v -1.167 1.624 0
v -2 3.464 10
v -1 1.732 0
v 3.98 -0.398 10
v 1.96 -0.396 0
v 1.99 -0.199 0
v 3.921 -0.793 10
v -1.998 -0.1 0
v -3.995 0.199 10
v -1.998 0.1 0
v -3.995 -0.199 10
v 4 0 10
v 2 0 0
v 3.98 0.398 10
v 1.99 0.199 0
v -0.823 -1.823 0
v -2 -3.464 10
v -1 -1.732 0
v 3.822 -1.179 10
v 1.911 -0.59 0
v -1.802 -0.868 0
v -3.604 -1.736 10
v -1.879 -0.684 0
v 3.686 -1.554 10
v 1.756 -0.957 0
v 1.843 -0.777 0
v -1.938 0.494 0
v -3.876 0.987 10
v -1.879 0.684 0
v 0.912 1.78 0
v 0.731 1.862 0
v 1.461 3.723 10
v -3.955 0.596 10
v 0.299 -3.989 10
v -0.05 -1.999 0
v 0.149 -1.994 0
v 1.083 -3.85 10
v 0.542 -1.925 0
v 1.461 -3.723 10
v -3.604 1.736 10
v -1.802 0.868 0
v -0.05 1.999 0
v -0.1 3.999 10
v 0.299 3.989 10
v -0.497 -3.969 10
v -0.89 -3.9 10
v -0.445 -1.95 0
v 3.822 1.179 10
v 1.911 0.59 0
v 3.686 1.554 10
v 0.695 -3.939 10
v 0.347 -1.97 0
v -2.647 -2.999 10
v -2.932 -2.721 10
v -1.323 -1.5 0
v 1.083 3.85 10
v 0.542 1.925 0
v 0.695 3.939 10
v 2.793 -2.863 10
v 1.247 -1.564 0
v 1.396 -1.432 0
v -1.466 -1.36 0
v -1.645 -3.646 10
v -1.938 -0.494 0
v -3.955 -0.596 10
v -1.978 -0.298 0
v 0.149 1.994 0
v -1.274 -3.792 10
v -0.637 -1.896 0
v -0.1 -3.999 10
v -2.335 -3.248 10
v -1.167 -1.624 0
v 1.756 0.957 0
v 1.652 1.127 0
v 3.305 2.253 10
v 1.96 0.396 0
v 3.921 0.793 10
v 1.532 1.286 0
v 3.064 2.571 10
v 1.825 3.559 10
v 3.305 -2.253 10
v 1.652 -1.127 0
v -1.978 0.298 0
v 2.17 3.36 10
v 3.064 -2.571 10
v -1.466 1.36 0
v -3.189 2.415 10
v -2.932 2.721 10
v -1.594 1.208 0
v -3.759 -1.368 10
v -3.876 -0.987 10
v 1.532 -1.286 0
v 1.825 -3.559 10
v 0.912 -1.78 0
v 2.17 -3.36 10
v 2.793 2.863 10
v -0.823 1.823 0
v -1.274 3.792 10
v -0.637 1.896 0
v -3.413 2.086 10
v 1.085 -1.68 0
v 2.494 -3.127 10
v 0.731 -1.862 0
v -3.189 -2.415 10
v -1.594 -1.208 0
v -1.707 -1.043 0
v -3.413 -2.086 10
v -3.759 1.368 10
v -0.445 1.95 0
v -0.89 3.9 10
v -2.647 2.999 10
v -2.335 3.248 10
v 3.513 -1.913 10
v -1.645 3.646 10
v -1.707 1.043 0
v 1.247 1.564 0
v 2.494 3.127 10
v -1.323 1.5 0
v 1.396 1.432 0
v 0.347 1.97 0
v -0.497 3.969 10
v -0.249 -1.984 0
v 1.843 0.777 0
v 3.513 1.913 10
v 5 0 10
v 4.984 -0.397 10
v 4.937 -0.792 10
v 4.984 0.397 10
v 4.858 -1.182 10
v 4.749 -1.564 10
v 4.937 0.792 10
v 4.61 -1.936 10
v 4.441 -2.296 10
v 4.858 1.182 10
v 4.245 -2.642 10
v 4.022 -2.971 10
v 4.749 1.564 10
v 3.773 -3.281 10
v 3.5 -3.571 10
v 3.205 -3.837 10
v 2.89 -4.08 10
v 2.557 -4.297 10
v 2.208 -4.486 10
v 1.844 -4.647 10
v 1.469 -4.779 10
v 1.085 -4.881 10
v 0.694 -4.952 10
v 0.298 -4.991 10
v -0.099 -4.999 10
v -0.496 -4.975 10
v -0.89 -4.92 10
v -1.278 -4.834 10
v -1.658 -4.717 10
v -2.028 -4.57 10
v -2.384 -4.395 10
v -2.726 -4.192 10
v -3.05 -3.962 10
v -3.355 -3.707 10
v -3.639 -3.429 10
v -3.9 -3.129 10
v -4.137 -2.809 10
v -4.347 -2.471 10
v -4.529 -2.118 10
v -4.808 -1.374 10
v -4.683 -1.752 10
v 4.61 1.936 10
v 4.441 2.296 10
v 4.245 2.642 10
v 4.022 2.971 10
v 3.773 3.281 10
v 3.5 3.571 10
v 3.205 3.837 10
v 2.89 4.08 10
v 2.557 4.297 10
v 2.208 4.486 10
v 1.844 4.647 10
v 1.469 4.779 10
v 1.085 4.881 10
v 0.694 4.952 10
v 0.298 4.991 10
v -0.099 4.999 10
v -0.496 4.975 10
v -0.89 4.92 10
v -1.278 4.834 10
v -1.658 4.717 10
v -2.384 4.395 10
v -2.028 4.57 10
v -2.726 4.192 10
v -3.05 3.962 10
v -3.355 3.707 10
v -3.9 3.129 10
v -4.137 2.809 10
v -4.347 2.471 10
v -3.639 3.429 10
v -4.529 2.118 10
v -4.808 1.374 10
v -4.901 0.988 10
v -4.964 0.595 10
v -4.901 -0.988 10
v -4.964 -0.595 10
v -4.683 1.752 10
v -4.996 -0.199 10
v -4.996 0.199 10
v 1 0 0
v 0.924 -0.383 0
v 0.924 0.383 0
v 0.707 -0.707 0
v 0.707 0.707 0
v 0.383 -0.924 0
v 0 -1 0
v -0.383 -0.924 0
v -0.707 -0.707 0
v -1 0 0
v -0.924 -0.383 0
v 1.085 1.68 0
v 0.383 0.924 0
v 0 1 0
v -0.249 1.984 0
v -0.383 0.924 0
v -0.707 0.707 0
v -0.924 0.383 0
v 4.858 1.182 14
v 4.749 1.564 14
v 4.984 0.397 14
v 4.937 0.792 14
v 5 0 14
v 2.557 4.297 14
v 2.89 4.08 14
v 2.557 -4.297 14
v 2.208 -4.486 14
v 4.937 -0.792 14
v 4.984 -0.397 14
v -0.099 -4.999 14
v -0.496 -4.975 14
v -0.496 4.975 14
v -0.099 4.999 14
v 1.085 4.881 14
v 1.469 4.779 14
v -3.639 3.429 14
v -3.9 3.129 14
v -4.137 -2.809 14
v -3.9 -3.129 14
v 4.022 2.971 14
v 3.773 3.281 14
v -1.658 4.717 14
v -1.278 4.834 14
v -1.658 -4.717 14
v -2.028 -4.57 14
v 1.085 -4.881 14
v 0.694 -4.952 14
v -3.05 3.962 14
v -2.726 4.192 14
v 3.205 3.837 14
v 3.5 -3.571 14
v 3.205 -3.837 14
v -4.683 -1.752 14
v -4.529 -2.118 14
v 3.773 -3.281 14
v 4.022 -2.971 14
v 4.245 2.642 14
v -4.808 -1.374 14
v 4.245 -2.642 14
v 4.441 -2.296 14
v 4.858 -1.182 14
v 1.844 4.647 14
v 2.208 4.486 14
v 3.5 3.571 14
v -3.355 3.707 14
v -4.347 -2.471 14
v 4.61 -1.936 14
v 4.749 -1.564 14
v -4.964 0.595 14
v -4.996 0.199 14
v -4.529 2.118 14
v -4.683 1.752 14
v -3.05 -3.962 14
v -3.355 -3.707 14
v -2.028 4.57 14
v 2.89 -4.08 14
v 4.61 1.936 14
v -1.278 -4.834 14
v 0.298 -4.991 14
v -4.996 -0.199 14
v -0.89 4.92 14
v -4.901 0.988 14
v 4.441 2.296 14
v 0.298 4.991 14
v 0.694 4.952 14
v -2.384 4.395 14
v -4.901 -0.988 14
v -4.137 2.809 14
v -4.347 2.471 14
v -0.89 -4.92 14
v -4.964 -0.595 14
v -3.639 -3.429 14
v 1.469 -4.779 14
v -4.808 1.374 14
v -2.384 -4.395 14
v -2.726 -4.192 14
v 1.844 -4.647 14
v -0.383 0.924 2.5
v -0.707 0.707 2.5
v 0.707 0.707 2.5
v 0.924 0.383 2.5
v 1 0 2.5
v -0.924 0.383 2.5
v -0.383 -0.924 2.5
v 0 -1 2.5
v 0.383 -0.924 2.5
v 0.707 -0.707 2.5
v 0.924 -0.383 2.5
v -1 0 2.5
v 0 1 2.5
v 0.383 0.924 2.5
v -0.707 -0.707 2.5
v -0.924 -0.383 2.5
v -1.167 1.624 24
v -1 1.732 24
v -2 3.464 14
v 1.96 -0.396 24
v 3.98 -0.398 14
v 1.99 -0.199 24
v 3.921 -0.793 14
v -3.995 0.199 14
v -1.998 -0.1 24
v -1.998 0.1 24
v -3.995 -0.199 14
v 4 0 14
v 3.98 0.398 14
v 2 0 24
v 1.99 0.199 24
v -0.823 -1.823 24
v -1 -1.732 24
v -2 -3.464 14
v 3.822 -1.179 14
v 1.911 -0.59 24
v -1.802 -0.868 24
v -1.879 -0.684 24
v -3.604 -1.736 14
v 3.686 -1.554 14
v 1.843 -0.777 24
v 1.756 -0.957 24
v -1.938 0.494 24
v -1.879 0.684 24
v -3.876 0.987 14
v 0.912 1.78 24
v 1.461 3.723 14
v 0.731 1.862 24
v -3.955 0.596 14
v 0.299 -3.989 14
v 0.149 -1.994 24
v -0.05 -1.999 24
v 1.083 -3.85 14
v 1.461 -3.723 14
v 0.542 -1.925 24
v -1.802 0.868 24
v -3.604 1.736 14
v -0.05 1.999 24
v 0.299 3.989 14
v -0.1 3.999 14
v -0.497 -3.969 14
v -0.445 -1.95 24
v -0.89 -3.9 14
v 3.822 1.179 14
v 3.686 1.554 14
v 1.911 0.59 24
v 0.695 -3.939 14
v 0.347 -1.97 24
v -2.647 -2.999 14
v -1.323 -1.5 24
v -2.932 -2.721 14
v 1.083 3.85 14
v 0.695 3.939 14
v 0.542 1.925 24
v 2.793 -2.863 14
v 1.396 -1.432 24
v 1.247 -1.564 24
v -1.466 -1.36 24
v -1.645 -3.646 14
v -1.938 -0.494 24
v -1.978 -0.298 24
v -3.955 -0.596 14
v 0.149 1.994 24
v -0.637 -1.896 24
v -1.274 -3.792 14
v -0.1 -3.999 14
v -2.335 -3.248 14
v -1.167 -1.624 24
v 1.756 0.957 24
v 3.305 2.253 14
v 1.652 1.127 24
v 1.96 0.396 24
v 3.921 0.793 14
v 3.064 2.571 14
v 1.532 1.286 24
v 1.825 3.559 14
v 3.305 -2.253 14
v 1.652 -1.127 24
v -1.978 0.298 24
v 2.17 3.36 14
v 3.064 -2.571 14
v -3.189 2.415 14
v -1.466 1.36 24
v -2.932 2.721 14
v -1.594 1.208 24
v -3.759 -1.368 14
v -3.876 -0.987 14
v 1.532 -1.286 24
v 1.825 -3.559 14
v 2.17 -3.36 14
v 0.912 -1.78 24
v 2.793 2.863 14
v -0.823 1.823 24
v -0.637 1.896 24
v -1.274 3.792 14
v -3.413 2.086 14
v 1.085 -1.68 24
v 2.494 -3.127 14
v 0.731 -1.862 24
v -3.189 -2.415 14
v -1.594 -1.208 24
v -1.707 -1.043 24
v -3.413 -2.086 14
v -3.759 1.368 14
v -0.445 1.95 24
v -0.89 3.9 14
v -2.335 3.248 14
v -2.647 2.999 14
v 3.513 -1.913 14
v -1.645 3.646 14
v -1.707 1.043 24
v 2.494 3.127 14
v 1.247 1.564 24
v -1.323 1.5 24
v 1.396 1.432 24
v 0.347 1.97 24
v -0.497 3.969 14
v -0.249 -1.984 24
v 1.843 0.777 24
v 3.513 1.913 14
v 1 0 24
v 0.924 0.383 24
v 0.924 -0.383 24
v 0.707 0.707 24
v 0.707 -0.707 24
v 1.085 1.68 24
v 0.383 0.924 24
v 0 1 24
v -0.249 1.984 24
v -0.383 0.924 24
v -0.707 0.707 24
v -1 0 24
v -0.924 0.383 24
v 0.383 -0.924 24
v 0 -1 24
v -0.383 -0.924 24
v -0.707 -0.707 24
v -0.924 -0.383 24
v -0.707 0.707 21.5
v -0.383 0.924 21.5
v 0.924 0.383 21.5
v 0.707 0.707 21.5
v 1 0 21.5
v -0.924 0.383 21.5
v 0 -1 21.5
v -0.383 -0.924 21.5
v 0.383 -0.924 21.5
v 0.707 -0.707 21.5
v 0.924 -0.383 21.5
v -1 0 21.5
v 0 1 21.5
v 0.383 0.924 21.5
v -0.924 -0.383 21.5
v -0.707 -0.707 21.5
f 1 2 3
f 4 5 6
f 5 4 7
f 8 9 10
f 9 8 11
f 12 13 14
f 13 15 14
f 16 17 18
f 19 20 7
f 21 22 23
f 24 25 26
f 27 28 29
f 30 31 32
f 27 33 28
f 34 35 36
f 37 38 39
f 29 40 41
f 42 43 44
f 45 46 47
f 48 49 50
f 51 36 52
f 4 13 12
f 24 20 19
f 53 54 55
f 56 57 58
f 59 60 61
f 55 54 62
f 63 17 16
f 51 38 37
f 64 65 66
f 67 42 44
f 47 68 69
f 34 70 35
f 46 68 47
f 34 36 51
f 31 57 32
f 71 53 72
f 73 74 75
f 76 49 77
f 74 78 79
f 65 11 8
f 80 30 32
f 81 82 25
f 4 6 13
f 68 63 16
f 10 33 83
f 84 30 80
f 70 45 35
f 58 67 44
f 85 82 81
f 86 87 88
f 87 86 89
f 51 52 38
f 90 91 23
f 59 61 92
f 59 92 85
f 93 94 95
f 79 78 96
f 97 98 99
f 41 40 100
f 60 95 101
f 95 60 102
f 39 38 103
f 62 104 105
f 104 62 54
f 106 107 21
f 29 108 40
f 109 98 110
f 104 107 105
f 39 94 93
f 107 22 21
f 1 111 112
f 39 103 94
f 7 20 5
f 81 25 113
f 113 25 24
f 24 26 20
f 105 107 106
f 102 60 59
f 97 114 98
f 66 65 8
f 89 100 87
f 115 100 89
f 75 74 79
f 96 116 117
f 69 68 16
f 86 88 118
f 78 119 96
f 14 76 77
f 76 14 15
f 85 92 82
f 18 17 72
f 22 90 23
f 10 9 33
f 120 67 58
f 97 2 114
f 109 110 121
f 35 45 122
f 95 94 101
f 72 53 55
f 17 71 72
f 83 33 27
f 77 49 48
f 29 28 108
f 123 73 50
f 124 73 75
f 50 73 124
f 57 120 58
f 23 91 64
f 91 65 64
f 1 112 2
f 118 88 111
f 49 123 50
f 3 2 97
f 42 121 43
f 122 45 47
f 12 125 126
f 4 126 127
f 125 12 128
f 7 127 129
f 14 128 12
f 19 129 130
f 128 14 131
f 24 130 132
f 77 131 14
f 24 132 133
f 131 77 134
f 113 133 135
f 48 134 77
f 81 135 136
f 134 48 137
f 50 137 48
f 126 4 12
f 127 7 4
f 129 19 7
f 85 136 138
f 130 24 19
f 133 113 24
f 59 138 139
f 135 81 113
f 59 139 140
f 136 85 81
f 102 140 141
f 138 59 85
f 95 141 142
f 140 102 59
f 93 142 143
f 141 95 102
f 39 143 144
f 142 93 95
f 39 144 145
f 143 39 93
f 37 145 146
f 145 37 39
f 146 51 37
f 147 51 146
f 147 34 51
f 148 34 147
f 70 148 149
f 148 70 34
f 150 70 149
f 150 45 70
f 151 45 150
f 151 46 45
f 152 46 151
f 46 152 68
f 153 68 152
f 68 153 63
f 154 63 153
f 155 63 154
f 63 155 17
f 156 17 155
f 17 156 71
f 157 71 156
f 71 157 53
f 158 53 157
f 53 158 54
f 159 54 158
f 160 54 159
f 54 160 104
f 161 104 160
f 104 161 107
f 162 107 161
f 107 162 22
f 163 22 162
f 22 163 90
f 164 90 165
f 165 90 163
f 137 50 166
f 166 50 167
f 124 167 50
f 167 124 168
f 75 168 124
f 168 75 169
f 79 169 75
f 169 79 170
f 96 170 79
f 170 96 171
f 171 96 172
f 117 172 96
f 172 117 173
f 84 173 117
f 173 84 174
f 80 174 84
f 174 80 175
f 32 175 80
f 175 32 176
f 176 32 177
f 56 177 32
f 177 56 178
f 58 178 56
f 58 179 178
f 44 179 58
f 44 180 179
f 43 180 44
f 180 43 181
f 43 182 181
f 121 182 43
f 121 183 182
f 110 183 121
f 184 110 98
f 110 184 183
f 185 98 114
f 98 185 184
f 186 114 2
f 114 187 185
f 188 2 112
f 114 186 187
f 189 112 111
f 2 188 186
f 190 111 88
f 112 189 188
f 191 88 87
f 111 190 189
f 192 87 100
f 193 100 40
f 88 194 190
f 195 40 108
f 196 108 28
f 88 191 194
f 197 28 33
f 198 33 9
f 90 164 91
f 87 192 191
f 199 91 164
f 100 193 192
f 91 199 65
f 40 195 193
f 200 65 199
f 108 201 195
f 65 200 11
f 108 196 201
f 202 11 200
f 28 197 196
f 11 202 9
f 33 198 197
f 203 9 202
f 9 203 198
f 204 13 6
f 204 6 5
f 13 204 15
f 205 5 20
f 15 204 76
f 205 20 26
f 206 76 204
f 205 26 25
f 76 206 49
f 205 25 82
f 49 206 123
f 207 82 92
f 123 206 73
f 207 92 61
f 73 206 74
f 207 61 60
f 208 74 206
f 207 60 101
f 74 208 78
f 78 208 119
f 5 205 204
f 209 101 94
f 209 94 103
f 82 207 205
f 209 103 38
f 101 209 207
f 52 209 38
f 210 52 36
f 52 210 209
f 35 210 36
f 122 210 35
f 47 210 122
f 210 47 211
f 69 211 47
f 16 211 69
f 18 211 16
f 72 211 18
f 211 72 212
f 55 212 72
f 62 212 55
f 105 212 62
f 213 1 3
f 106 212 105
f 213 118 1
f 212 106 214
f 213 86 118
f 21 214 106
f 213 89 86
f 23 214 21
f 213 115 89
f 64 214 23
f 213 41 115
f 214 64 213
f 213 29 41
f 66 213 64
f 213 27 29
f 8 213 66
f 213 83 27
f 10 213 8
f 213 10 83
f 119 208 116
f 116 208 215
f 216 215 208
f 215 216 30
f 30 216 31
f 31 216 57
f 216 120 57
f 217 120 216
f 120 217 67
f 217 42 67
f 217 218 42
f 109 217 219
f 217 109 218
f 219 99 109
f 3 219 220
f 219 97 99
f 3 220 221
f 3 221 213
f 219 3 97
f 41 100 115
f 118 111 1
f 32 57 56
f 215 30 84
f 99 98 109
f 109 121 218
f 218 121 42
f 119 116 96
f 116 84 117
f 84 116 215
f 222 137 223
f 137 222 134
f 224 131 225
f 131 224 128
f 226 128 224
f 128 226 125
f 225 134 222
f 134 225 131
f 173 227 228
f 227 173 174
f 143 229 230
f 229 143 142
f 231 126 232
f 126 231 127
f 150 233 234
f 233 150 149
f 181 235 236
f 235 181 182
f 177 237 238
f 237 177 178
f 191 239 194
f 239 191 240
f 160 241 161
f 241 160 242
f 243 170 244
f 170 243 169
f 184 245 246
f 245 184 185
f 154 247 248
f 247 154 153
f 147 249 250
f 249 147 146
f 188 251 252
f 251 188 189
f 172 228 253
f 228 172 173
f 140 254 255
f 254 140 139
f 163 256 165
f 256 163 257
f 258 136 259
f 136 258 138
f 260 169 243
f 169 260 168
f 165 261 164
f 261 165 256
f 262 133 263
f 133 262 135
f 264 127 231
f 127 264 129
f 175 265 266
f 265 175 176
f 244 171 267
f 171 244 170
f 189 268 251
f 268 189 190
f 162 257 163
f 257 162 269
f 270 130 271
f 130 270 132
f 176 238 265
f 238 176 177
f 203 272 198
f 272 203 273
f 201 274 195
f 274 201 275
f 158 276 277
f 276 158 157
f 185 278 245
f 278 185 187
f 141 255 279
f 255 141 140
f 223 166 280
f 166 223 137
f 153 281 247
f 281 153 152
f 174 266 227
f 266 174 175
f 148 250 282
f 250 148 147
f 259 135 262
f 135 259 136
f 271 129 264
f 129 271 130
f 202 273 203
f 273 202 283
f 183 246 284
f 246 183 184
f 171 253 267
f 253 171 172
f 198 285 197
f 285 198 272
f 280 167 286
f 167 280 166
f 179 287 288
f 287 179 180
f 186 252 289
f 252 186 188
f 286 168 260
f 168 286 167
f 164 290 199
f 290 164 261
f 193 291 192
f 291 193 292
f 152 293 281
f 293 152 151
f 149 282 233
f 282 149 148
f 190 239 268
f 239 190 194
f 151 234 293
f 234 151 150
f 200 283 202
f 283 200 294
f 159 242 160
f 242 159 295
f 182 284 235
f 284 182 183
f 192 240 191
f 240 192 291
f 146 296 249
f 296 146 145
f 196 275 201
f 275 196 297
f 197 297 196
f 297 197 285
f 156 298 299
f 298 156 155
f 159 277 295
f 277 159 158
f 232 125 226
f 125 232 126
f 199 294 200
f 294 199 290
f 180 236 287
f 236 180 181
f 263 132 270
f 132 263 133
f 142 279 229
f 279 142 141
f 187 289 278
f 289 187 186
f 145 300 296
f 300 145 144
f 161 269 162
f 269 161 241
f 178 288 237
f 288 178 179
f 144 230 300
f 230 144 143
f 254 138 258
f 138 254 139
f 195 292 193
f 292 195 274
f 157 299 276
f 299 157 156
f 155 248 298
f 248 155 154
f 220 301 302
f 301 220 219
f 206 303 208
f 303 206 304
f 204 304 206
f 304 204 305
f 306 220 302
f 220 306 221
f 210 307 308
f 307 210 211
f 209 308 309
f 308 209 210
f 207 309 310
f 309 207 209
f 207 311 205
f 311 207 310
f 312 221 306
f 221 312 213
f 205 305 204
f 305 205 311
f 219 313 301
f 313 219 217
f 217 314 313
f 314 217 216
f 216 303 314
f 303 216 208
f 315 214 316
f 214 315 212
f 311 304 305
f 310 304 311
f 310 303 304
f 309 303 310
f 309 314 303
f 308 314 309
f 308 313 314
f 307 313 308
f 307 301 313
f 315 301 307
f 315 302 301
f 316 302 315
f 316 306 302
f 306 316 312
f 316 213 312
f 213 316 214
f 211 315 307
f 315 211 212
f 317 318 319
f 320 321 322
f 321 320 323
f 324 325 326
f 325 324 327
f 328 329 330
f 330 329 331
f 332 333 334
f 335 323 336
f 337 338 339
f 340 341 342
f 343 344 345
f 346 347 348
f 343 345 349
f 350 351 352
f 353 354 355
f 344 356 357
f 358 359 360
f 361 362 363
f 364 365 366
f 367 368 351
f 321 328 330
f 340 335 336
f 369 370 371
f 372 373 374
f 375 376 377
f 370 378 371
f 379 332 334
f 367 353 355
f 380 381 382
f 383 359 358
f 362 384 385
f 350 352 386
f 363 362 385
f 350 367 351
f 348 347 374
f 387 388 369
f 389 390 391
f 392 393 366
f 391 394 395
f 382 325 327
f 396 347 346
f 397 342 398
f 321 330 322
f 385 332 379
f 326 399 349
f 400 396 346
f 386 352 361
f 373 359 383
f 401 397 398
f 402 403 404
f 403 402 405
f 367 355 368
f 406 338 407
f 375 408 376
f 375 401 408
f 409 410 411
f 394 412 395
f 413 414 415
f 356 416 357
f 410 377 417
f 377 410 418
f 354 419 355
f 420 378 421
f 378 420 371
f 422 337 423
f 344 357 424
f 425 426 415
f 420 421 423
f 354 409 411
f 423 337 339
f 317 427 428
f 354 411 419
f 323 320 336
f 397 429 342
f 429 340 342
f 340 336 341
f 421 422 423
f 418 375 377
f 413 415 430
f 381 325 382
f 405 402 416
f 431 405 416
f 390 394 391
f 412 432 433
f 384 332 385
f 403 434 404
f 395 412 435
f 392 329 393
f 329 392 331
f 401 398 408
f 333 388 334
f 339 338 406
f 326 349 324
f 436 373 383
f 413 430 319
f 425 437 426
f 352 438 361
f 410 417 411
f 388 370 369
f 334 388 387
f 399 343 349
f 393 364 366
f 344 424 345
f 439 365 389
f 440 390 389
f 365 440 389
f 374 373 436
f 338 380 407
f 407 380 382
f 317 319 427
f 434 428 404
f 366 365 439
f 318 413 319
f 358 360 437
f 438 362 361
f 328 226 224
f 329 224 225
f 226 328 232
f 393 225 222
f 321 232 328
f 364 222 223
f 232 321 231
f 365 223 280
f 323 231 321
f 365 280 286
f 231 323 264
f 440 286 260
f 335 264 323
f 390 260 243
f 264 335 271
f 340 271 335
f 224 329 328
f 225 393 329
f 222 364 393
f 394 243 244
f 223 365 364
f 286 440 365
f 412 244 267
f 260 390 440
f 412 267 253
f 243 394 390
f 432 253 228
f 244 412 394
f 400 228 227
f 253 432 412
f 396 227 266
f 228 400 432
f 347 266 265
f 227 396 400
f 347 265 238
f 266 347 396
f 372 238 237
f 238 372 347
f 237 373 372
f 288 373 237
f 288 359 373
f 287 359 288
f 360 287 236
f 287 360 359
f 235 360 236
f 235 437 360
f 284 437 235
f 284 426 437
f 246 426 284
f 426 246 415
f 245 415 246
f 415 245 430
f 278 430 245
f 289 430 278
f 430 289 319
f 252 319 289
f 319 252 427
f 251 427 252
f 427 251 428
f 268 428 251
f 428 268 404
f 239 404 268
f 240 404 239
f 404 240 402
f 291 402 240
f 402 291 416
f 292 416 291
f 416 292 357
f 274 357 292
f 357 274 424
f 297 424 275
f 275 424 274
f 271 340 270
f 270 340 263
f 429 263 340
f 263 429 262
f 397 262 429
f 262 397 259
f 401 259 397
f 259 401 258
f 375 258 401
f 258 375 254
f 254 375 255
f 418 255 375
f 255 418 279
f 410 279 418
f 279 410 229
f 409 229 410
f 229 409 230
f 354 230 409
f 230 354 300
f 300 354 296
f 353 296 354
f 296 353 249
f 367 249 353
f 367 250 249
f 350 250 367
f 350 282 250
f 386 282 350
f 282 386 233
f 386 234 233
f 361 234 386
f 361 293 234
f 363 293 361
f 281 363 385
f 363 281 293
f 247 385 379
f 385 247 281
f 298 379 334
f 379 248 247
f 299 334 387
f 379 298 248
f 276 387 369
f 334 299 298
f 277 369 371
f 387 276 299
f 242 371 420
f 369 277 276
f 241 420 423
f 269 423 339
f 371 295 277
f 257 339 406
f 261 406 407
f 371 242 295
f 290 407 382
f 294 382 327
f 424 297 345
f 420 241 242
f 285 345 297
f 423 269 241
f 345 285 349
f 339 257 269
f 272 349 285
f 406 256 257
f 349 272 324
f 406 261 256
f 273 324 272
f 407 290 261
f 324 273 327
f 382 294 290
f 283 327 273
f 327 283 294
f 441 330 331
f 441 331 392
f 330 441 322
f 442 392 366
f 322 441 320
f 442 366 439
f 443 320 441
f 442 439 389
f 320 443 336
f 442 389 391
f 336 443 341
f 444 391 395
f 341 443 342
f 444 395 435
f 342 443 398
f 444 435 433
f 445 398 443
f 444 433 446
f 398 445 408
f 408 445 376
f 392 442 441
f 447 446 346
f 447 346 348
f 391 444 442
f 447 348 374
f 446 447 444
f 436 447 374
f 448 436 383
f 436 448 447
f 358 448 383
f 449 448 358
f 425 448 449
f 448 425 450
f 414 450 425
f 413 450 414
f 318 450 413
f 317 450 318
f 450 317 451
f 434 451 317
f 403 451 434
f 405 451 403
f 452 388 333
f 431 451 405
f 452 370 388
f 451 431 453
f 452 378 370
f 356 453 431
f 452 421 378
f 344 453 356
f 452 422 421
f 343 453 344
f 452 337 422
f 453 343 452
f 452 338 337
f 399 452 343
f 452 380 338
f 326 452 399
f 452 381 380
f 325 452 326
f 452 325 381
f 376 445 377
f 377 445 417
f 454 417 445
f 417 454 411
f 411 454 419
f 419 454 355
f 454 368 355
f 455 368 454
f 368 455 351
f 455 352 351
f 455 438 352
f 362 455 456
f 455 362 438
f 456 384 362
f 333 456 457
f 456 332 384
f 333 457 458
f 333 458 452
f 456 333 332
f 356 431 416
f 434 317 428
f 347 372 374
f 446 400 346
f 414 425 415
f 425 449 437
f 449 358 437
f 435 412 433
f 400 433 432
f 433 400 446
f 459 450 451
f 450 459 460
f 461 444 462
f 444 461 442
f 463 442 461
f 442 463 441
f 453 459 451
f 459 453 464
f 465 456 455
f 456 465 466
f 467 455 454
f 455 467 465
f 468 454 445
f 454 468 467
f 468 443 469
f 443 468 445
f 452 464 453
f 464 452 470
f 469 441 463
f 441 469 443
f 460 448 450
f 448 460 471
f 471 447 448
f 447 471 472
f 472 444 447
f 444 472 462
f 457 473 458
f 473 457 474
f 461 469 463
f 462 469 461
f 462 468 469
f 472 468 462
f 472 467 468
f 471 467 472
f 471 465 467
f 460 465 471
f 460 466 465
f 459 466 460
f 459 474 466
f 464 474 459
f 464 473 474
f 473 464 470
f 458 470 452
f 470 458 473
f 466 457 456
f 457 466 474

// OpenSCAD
//############################################################################## 
//                    Odometer - Magnet Insertion Tool Tip
//############################################################################## 
// 
// Odometer for the toy car Tamiya TT-02. The odometer can be mounted at the
// differential output shaft.
//
// This part is a tool, to insert magnets into the magnet wheel with the right
// orientation.
//

module MagnetInsertionToolTip() {
    $fa = 4;
    $fs = 0.4;

    magnet_diameter = 2;
    magnet_height = 2;

    module tip_1() {
        difference() {
            union(){
                cylinder(d1=magnet_diameter+2, d2=8, h=10);
                translate([0, 0, 10]) 
                cylinder(d=10, h=2);
            }
            cylinder(d=magnet_diameter, h=magnet_height + 0.5);
        };
    }

    translate([0, 0, 12]) {
        translate([0, 0, -12]) 
        tip_1();
        mirror([0, 0, 1]) {
            translate([0, 0, -12]) 
            tip_1();
        }
    }
}

MagnetInsertionToolTip();
